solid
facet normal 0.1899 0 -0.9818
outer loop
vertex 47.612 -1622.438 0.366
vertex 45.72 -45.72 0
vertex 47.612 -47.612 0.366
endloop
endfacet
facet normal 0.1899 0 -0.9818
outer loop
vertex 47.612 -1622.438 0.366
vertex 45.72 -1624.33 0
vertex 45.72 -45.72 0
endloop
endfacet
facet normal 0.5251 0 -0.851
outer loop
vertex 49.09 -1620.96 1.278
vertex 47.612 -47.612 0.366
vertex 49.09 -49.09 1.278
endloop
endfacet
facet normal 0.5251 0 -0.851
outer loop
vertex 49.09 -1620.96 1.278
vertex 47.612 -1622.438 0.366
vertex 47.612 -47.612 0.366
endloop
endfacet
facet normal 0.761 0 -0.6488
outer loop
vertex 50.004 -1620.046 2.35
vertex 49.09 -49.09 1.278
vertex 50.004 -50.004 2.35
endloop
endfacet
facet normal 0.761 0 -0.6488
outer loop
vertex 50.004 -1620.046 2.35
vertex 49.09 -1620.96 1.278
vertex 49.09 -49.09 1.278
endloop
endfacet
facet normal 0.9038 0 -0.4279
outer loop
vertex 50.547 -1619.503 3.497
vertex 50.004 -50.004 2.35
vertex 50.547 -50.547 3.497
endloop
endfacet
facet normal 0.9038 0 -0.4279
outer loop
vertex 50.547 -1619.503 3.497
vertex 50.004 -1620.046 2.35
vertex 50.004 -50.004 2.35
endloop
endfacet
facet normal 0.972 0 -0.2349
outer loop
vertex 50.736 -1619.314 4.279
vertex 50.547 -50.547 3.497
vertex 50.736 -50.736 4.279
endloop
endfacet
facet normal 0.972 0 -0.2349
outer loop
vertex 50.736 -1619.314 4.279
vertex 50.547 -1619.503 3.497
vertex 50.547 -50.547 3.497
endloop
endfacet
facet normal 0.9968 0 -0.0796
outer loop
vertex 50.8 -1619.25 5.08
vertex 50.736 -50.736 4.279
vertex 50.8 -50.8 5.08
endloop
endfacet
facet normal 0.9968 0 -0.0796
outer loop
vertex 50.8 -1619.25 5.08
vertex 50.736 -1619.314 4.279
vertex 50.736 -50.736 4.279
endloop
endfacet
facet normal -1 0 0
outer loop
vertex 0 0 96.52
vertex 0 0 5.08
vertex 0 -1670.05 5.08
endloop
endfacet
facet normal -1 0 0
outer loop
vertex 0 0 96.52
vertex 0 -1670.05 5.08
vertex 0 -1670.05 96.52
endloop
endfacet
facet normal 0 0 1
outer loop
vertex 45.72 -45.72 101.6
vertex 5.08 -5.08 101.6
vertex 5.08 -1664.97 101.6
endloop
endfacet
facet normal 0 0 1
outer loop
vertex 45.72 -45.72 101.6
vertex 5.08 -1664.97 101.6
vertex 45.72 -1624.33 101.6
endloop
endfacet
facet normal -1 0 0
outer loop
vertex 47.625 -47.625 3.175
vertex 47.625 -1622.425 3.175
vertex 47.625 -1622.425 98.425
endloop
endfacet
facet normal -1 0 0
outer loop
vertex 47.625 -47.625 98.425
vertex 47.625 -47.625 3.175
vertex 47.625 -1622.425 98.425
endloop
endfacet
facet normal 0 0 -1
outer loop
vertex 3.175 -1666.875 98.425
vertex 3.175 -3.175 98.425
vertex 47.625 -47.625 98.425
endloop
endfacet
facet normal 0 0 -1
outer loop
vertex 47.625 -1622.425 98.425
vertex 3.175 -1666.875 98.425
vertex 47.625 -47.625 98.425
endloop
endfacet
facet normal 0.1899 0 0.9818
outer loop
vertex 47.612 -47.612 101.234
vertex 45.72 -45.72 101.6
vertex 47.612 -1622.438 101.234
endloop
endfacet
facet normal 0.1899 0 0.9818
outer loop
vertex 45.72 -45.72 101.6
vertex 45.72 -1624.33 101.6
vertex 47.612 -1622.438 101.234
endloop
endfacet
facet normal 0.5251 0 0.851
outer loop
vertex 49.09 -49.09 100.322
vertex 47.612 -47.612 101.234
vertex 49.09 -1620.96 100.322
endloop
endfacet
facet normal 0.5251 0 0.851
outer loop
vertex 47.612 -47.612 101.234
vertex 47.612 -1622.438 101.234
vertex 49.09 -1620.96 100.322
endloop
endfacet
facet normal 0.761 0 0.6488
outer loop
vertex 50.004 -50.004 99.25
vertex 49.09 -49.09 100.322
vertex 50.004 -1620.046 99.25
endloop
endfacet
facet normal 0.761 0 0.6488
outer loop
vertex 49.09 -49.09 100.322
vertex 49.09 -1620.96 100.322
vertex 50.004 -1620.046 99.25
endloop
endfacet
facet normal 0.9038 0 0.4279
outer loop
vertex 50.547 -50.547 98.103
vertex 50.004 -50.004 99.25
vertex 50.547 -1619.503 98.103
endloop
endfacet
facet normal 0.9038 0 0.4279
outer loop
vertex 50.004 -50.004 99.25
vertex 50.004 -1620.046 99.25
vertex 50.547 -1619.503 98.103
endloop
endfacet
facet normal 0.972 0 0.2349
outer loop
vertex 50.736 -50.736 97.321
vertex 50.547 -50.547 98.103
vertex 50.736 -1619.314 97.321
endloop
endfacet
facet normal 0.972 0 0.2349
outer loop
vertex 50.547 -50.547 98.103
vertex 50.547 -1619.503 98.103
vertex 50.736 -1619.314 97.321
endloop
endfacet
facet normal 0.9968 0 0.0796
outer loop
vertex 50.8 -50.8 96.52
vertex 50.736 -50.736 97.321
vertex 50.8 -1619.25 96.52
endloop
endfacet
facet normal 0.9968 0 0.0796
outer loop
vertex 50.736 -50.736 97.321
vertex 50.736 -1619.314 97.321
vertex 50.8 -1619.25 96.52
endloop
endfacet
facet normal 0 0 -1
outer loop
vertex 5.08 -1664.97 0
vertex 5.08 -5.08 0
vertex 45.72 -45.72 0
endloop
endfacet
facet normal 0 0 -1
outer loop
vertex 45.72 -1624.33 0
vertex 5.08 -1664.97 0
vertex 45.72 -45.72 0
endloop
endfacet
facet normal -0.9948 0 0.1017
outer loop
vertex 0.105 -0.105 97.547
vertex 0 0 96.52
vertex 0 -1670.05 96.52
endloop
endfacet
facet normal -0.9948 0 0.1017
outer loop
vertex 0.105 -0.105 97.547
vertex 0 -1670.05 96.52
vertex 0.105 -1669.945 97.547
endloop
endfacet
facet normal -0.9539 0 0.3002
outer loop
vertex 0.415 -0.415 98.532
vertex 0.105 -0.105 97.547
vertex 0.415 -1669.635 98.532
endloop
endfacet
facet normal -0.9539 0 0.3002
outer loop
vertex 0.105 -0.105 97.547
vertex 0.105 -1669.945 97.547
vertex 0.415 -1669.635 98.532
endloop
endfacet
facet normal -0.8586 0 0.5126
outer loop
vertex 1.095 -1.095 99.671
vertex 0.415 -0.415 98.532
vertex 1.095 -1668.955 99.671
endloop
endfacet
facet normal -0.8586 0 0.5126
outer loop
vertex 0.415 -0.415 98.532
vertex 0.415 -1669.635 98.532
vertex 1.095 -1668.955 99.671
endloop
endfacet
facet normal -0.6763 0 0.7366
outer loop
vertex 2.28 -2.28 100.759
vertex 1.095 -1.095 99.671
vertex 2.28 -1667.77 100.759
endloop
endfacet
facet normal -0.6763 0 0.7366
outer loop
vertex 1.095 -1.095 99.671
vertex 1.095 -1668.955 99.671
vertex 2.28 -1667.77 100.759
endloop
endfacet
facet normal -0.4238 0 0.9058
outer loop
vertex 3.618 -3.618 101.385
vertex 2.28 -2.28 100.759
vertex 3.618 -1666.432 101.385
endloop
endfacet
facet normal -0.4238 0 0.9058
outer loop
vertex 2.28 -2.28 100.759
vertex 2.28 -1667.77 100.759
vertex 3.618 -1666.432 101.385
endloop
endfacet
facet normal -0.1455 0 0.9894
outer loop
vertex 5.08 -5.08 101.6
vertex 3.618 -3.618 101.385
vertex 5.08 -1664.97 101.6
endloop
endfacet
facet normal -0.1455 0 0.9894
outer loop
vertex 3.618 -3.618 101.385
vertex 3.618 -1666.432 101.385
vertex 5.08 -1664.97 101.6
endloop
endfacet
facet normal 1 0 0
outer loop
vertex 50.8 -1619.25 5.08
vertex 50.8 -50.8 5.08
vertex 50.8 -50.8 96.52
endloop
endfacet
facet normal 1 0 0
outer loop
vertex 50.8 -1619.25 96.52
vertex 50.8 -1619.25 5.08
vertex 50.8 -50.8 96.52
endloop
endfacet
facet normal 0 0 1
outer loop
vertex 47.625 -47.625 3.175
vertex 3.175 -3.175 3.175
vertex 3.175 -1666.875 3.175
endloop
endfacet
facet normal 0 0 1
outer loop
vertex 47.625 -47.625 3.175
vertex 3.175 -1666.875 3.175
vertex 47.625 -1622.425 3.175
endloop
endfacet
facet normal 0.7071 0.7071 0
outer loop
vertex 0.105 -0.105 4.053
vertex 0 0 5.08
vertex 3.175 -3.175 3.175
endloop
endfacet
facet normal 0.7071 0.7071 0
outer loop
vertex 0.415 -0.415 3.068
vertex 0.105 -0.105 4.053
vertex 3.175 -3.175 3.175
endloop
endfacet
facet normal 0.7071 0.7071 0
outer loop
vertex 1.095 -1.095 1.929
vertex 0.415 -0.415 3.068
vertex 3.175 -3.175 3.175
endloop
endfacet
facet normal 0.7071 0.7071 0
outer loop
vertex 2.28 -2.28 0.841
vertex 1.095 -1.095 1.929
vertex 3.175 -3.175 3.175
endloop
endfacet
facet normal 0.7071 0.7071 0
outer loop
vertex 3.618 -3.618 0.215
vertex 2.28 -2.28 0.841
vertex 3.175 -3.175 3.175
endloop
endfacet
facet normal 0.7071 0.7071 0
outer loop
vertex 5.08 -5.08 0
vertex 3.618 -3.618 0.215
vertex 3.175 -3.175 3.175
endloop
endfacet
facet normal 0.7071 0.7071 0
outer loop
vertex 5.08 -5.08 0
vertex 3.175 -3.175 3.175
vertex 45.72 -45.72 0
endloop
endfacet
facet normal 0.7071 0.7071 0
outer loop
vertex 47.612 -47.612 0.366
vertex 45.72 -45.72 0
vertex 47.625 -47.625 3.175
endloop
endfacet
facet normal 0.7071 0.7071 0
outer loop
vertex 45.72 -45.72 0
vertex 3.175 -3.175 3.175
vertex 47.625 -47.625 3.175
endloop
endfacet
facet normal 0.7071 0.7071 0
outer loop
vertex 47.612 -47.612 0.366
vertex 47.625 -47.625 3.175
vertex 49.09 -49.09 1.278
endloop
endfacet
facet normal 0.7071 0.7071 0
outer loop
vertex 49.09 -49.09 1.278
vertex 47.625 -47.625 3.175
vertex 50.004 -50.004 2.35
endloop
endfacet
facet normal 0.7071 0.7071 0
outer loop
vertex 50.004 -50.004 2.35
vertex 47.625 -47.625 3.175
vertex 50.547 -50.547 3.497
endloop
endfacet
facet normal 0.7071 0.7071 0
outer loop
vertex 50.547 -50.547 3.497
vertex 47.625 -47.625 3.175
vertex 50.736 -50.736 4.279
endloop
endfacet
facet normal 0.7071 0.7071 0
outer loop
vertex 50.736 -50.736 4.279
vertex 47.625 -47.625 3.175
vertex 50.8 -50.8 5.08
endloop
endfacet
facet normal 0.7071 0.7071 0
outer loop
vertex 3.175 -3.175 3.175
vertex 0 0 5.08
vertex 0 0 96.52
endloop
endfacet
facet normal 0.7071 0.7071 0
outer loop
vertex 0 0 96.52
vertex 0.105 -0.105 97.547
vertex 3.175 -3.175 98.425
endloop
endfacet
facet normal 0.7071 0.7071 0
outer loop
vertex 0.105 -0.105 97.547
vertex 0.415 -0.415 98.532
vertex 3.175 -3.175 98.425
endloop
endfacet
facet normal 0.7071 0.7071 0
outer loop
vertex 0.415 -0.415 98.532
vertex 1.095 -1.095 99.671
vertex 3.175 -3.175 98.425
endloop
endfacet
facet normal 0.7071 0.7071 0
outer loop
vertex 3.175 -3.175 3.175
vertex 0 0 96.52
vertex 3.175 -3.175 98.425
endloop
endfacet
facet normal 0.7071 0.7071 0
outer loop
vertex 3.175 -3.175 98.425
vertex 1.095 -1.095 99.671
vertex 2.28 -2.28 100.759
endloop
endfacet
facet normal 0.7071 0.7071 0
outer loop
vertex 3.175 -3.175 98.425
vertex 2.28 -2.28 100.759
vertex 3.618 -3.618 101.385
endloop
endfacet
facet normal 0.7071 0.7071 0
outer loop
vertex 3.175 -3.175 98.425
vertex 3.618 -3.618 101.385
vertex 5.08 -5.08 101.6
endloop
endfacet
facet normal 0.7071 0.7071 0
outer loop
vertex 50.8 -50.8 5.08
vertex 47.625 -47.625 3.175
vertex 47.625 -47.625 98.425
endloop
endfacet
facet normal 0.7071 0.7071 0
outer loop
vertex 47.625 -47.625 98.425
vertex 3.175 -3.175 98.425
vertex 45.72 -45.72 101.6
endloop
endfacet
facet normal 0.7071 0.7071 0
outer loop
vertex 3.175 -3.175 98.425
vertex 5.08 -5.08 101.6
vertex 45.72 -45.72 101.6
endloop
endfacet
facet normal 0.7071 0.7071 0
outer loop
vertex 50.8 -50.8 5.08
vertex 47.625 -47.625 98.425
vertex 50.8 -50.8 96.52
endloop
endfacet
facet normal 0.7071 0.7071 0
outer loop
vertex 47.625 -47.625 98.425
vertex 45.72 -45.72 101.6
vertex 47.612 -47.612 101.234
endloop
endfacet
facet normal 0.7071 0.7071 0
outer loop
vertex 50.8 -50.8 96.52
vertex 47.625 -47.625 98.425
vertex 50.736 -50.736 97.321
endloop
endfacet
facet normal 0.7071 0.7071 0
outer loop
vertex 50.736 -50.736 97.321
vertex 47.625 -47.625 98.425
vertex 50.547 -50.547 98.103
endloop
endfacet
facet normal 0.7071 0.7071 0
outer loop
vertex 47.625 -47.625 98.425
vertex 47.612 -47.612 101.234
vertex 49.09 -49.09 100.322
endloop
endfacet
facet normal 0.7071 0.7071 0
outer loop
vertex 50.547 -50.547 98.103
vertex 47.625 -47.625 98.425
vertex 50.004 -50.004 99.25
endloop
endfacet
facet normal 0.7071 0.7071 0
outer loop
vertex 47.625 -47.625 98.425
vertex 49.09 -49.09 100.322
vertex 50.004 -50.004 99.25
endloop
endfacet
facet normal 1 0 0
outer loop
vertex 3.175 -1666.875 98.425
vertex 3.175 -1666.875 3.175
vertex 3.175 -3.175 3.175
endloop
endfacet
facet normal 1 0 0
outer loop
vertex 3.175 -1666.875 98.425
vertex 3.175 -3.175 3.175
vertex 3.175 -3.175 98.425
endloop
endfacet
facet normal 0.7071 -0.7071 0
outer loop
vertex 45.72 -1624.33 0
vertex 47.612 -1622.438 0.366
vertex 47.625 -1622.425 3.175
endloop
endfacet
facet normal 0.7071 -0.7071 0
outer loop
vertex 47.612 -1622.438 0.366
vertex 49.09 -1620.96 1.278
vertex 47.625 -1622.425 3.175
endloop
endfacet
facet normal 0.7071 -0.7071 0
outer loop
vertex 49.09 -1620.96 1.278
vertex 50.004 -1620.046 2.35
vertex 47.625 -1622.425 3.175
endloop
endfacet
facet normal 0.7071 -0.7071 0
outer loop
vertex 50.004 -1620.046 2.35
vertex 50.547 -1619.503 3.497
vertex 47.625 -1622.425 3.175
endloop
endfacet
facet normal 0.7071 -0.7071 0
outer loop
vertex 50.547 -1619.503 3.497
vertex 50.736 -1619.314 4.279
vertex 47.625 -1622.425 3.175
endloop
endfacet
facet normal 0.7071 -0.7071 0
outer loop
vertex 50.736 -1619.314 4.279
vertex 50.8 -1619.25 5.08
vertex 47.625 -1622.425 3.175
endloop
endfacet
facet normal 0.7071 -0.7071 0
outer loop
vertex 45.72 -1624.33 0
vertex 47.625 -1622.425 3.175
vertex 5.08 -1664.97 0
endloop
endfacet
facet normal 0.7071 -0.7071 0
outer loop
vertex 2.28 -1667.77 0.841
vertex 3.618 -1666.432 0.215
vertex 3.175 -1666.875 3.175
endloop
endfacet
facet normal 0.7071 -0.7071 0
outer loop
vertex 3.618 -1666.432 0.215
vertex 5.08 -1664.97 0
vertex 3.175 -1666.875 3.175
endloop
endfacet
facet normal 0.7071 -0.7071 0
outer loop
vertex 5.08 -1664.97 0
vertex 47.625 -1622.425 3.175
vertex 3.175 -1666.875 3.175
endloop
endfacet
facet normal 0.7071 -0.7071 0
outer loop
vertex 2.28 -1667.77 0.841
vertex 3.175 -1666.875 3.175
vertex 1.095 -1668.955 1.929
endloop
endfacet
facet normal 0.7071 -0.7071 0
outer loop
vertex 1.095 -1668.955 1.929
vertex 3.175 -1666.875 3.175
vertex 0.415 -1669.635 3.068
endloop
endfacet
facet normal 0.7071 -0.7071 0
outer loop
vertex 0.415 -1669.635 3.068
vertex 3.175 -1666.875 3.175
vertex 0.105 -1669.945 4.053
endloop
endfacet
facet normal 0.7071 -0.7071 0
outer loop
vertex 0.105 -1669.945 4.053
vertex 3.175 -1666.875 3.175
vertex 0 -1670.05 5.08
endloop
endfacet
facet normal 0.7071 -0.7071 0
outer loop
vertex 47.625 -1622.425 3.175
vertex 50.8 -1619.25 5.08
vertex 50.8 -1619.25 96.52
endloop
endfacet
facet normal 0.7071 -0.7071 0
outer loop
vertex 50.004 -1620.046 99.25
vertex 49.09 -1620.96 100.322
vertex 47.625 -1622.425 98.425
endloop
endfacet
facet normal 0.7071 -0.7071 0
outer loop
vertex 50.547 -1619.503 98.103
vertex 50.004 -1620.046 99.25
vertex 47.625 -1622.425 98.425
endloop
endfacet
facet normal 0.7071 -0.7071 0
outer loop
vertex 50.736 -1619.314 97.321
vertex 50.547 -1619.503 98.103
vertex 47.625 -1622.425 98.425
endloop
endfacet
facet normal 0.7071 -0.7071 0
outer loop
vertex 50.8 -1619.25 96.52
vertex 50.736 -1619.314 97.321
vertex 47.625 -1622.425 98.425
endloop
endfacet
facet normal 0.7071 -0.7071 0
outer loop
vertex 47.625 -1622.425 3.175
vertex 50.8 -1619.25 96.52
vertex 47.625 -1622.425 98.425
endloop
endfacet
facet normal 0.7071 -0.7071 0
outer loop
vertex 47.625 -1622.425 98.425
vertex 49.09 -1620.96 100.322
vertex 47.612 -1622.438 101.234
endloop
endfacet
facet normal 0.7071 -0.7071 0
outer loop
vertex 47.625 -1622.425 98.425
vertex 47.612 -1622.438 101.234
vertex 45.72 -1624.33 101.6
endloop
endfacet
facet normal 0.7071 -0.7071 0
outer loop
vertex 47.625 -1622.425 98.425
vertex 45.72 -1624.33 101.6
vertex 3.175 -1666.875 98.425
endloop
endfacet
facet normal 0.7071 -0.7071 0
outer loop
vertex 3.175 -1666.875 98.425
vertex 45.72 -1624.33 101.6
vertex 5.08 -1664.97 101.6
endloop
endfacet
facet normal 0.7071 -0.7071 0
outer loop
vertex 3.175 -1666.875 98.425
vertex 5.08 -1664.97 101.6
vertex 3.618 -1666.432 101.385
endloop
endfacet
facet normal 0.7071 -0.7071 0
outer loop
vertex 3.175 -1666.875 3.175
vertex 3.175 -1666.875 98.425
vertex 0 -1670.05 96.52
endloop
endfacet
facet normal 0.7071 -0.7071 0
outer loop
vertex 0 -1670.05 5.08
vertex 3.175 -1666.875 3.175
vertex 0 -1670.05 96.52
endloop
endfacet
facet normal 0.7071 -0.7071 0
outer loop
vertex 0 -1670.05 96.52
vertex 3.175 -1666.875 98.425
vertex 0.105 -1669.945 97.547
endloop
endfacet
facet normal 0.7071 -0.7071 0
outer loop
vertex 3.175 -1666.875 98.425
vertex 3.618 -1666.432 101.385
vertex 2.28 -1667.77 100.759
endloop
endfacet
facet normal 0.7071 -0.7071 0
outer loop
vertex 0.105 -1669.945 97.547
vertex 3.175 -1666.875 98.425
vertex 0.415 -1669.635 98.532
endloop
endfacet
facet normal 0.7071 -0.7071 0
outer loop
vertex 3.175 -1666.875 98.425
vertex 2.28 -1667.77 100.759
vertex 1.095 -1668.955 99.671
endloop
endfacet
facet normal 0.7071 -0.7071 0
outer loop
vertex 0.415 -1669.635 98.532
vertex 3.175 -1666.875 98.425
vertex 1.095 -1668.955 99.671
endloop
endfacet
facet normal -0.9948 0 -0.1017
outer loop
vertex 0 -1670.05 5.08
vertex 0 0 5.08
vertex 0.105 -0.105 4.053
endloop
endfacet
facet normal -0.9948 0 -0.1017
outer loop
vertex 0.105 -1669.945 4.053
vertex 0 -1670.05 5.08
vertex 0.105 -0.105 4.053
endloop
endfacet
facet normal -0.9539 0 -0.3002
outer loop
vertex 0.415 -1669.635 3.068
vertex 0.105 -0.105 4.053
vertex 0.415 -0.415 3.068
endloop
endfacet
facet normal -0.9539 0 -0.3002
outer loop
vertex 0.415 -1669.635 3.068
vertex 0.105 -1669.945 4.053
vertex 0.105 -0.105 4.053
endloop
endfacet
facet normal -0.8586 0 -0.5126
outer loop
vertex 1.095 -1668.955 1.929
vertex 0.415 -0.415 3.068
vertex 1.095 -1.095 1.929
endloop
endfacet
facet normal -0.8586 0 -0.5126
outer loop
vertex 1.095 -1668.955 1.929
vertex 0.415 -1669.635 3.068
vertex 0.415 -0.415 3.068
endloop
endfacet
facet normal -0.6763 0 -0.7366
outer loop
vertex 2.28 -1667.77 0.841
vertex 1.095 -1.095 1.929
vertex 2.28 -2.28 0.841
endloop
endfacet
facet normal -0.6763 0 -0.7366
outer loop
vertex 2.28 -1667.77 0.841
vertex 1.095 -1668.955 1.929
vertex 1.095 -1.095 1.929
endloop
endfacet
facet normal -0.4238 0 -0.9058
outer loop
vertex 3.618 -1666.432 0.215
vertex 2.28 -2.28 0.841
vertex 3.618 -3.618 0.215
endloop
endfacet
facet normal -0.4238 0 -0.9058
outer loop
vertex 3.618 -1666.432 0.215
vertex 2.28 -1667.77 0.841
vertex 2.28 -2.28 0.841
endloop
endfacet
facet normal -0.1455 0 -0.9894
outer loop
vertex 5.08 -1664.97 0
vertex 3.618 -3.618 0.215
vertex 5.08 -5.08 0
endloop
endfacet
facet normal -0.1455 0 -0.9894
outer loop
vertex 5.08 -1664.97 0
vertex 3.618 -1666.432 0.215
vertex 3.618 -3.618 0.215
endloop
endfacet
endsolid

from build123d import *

# Parameters (mm, degrees)
F0_W     = 50.8
F0_H     = 101.6
F0_W_2   = 44.45
F0_H_2   = 95.25
F1_DEPTH = 1670.05
F3_DEPTH = 228.6
F4_R     = 5.08


with BuildPart() as f1:
    # F0 (on Front) → F1 (new body)
    with BuildSketch(Plane.XZ):
        with Locations((25.4, 50.8)):
            Rectangle(F0_W, F0_H)
        with Locations((25.4, 50.8)):
            Rectangle(F0_W_2, F0_H_2, mode=Mode.SUBTRACT)
    extrude(amount=F1_DEPTH)

    # F2 (on face) → F3 (cut)
    with BuildSketch(Plane.XY.offset(101.6)):
        Polygon((50.8, -1619.25), (0, -1670.05), (50.8, -1670.05), align=None)
        Polygon((50.8, 0), (0, 0), (50.8, -50.8), align=None)
    extrude(amount=-F3_DEPTH, mode=Mode.SUBTRACT)

    # F4
    f4_edges = [f1.edges().sort_by_distance(p)[0] for p in [
        (50.8, -835.025, 101.6),
        (50.8, -835.025, 0),
        (0, -835.025, 101.6),
        (0, -835.025, 0),
    ]]
    fillet(f4_edges, radius=F4_R)


solid = f1.part
